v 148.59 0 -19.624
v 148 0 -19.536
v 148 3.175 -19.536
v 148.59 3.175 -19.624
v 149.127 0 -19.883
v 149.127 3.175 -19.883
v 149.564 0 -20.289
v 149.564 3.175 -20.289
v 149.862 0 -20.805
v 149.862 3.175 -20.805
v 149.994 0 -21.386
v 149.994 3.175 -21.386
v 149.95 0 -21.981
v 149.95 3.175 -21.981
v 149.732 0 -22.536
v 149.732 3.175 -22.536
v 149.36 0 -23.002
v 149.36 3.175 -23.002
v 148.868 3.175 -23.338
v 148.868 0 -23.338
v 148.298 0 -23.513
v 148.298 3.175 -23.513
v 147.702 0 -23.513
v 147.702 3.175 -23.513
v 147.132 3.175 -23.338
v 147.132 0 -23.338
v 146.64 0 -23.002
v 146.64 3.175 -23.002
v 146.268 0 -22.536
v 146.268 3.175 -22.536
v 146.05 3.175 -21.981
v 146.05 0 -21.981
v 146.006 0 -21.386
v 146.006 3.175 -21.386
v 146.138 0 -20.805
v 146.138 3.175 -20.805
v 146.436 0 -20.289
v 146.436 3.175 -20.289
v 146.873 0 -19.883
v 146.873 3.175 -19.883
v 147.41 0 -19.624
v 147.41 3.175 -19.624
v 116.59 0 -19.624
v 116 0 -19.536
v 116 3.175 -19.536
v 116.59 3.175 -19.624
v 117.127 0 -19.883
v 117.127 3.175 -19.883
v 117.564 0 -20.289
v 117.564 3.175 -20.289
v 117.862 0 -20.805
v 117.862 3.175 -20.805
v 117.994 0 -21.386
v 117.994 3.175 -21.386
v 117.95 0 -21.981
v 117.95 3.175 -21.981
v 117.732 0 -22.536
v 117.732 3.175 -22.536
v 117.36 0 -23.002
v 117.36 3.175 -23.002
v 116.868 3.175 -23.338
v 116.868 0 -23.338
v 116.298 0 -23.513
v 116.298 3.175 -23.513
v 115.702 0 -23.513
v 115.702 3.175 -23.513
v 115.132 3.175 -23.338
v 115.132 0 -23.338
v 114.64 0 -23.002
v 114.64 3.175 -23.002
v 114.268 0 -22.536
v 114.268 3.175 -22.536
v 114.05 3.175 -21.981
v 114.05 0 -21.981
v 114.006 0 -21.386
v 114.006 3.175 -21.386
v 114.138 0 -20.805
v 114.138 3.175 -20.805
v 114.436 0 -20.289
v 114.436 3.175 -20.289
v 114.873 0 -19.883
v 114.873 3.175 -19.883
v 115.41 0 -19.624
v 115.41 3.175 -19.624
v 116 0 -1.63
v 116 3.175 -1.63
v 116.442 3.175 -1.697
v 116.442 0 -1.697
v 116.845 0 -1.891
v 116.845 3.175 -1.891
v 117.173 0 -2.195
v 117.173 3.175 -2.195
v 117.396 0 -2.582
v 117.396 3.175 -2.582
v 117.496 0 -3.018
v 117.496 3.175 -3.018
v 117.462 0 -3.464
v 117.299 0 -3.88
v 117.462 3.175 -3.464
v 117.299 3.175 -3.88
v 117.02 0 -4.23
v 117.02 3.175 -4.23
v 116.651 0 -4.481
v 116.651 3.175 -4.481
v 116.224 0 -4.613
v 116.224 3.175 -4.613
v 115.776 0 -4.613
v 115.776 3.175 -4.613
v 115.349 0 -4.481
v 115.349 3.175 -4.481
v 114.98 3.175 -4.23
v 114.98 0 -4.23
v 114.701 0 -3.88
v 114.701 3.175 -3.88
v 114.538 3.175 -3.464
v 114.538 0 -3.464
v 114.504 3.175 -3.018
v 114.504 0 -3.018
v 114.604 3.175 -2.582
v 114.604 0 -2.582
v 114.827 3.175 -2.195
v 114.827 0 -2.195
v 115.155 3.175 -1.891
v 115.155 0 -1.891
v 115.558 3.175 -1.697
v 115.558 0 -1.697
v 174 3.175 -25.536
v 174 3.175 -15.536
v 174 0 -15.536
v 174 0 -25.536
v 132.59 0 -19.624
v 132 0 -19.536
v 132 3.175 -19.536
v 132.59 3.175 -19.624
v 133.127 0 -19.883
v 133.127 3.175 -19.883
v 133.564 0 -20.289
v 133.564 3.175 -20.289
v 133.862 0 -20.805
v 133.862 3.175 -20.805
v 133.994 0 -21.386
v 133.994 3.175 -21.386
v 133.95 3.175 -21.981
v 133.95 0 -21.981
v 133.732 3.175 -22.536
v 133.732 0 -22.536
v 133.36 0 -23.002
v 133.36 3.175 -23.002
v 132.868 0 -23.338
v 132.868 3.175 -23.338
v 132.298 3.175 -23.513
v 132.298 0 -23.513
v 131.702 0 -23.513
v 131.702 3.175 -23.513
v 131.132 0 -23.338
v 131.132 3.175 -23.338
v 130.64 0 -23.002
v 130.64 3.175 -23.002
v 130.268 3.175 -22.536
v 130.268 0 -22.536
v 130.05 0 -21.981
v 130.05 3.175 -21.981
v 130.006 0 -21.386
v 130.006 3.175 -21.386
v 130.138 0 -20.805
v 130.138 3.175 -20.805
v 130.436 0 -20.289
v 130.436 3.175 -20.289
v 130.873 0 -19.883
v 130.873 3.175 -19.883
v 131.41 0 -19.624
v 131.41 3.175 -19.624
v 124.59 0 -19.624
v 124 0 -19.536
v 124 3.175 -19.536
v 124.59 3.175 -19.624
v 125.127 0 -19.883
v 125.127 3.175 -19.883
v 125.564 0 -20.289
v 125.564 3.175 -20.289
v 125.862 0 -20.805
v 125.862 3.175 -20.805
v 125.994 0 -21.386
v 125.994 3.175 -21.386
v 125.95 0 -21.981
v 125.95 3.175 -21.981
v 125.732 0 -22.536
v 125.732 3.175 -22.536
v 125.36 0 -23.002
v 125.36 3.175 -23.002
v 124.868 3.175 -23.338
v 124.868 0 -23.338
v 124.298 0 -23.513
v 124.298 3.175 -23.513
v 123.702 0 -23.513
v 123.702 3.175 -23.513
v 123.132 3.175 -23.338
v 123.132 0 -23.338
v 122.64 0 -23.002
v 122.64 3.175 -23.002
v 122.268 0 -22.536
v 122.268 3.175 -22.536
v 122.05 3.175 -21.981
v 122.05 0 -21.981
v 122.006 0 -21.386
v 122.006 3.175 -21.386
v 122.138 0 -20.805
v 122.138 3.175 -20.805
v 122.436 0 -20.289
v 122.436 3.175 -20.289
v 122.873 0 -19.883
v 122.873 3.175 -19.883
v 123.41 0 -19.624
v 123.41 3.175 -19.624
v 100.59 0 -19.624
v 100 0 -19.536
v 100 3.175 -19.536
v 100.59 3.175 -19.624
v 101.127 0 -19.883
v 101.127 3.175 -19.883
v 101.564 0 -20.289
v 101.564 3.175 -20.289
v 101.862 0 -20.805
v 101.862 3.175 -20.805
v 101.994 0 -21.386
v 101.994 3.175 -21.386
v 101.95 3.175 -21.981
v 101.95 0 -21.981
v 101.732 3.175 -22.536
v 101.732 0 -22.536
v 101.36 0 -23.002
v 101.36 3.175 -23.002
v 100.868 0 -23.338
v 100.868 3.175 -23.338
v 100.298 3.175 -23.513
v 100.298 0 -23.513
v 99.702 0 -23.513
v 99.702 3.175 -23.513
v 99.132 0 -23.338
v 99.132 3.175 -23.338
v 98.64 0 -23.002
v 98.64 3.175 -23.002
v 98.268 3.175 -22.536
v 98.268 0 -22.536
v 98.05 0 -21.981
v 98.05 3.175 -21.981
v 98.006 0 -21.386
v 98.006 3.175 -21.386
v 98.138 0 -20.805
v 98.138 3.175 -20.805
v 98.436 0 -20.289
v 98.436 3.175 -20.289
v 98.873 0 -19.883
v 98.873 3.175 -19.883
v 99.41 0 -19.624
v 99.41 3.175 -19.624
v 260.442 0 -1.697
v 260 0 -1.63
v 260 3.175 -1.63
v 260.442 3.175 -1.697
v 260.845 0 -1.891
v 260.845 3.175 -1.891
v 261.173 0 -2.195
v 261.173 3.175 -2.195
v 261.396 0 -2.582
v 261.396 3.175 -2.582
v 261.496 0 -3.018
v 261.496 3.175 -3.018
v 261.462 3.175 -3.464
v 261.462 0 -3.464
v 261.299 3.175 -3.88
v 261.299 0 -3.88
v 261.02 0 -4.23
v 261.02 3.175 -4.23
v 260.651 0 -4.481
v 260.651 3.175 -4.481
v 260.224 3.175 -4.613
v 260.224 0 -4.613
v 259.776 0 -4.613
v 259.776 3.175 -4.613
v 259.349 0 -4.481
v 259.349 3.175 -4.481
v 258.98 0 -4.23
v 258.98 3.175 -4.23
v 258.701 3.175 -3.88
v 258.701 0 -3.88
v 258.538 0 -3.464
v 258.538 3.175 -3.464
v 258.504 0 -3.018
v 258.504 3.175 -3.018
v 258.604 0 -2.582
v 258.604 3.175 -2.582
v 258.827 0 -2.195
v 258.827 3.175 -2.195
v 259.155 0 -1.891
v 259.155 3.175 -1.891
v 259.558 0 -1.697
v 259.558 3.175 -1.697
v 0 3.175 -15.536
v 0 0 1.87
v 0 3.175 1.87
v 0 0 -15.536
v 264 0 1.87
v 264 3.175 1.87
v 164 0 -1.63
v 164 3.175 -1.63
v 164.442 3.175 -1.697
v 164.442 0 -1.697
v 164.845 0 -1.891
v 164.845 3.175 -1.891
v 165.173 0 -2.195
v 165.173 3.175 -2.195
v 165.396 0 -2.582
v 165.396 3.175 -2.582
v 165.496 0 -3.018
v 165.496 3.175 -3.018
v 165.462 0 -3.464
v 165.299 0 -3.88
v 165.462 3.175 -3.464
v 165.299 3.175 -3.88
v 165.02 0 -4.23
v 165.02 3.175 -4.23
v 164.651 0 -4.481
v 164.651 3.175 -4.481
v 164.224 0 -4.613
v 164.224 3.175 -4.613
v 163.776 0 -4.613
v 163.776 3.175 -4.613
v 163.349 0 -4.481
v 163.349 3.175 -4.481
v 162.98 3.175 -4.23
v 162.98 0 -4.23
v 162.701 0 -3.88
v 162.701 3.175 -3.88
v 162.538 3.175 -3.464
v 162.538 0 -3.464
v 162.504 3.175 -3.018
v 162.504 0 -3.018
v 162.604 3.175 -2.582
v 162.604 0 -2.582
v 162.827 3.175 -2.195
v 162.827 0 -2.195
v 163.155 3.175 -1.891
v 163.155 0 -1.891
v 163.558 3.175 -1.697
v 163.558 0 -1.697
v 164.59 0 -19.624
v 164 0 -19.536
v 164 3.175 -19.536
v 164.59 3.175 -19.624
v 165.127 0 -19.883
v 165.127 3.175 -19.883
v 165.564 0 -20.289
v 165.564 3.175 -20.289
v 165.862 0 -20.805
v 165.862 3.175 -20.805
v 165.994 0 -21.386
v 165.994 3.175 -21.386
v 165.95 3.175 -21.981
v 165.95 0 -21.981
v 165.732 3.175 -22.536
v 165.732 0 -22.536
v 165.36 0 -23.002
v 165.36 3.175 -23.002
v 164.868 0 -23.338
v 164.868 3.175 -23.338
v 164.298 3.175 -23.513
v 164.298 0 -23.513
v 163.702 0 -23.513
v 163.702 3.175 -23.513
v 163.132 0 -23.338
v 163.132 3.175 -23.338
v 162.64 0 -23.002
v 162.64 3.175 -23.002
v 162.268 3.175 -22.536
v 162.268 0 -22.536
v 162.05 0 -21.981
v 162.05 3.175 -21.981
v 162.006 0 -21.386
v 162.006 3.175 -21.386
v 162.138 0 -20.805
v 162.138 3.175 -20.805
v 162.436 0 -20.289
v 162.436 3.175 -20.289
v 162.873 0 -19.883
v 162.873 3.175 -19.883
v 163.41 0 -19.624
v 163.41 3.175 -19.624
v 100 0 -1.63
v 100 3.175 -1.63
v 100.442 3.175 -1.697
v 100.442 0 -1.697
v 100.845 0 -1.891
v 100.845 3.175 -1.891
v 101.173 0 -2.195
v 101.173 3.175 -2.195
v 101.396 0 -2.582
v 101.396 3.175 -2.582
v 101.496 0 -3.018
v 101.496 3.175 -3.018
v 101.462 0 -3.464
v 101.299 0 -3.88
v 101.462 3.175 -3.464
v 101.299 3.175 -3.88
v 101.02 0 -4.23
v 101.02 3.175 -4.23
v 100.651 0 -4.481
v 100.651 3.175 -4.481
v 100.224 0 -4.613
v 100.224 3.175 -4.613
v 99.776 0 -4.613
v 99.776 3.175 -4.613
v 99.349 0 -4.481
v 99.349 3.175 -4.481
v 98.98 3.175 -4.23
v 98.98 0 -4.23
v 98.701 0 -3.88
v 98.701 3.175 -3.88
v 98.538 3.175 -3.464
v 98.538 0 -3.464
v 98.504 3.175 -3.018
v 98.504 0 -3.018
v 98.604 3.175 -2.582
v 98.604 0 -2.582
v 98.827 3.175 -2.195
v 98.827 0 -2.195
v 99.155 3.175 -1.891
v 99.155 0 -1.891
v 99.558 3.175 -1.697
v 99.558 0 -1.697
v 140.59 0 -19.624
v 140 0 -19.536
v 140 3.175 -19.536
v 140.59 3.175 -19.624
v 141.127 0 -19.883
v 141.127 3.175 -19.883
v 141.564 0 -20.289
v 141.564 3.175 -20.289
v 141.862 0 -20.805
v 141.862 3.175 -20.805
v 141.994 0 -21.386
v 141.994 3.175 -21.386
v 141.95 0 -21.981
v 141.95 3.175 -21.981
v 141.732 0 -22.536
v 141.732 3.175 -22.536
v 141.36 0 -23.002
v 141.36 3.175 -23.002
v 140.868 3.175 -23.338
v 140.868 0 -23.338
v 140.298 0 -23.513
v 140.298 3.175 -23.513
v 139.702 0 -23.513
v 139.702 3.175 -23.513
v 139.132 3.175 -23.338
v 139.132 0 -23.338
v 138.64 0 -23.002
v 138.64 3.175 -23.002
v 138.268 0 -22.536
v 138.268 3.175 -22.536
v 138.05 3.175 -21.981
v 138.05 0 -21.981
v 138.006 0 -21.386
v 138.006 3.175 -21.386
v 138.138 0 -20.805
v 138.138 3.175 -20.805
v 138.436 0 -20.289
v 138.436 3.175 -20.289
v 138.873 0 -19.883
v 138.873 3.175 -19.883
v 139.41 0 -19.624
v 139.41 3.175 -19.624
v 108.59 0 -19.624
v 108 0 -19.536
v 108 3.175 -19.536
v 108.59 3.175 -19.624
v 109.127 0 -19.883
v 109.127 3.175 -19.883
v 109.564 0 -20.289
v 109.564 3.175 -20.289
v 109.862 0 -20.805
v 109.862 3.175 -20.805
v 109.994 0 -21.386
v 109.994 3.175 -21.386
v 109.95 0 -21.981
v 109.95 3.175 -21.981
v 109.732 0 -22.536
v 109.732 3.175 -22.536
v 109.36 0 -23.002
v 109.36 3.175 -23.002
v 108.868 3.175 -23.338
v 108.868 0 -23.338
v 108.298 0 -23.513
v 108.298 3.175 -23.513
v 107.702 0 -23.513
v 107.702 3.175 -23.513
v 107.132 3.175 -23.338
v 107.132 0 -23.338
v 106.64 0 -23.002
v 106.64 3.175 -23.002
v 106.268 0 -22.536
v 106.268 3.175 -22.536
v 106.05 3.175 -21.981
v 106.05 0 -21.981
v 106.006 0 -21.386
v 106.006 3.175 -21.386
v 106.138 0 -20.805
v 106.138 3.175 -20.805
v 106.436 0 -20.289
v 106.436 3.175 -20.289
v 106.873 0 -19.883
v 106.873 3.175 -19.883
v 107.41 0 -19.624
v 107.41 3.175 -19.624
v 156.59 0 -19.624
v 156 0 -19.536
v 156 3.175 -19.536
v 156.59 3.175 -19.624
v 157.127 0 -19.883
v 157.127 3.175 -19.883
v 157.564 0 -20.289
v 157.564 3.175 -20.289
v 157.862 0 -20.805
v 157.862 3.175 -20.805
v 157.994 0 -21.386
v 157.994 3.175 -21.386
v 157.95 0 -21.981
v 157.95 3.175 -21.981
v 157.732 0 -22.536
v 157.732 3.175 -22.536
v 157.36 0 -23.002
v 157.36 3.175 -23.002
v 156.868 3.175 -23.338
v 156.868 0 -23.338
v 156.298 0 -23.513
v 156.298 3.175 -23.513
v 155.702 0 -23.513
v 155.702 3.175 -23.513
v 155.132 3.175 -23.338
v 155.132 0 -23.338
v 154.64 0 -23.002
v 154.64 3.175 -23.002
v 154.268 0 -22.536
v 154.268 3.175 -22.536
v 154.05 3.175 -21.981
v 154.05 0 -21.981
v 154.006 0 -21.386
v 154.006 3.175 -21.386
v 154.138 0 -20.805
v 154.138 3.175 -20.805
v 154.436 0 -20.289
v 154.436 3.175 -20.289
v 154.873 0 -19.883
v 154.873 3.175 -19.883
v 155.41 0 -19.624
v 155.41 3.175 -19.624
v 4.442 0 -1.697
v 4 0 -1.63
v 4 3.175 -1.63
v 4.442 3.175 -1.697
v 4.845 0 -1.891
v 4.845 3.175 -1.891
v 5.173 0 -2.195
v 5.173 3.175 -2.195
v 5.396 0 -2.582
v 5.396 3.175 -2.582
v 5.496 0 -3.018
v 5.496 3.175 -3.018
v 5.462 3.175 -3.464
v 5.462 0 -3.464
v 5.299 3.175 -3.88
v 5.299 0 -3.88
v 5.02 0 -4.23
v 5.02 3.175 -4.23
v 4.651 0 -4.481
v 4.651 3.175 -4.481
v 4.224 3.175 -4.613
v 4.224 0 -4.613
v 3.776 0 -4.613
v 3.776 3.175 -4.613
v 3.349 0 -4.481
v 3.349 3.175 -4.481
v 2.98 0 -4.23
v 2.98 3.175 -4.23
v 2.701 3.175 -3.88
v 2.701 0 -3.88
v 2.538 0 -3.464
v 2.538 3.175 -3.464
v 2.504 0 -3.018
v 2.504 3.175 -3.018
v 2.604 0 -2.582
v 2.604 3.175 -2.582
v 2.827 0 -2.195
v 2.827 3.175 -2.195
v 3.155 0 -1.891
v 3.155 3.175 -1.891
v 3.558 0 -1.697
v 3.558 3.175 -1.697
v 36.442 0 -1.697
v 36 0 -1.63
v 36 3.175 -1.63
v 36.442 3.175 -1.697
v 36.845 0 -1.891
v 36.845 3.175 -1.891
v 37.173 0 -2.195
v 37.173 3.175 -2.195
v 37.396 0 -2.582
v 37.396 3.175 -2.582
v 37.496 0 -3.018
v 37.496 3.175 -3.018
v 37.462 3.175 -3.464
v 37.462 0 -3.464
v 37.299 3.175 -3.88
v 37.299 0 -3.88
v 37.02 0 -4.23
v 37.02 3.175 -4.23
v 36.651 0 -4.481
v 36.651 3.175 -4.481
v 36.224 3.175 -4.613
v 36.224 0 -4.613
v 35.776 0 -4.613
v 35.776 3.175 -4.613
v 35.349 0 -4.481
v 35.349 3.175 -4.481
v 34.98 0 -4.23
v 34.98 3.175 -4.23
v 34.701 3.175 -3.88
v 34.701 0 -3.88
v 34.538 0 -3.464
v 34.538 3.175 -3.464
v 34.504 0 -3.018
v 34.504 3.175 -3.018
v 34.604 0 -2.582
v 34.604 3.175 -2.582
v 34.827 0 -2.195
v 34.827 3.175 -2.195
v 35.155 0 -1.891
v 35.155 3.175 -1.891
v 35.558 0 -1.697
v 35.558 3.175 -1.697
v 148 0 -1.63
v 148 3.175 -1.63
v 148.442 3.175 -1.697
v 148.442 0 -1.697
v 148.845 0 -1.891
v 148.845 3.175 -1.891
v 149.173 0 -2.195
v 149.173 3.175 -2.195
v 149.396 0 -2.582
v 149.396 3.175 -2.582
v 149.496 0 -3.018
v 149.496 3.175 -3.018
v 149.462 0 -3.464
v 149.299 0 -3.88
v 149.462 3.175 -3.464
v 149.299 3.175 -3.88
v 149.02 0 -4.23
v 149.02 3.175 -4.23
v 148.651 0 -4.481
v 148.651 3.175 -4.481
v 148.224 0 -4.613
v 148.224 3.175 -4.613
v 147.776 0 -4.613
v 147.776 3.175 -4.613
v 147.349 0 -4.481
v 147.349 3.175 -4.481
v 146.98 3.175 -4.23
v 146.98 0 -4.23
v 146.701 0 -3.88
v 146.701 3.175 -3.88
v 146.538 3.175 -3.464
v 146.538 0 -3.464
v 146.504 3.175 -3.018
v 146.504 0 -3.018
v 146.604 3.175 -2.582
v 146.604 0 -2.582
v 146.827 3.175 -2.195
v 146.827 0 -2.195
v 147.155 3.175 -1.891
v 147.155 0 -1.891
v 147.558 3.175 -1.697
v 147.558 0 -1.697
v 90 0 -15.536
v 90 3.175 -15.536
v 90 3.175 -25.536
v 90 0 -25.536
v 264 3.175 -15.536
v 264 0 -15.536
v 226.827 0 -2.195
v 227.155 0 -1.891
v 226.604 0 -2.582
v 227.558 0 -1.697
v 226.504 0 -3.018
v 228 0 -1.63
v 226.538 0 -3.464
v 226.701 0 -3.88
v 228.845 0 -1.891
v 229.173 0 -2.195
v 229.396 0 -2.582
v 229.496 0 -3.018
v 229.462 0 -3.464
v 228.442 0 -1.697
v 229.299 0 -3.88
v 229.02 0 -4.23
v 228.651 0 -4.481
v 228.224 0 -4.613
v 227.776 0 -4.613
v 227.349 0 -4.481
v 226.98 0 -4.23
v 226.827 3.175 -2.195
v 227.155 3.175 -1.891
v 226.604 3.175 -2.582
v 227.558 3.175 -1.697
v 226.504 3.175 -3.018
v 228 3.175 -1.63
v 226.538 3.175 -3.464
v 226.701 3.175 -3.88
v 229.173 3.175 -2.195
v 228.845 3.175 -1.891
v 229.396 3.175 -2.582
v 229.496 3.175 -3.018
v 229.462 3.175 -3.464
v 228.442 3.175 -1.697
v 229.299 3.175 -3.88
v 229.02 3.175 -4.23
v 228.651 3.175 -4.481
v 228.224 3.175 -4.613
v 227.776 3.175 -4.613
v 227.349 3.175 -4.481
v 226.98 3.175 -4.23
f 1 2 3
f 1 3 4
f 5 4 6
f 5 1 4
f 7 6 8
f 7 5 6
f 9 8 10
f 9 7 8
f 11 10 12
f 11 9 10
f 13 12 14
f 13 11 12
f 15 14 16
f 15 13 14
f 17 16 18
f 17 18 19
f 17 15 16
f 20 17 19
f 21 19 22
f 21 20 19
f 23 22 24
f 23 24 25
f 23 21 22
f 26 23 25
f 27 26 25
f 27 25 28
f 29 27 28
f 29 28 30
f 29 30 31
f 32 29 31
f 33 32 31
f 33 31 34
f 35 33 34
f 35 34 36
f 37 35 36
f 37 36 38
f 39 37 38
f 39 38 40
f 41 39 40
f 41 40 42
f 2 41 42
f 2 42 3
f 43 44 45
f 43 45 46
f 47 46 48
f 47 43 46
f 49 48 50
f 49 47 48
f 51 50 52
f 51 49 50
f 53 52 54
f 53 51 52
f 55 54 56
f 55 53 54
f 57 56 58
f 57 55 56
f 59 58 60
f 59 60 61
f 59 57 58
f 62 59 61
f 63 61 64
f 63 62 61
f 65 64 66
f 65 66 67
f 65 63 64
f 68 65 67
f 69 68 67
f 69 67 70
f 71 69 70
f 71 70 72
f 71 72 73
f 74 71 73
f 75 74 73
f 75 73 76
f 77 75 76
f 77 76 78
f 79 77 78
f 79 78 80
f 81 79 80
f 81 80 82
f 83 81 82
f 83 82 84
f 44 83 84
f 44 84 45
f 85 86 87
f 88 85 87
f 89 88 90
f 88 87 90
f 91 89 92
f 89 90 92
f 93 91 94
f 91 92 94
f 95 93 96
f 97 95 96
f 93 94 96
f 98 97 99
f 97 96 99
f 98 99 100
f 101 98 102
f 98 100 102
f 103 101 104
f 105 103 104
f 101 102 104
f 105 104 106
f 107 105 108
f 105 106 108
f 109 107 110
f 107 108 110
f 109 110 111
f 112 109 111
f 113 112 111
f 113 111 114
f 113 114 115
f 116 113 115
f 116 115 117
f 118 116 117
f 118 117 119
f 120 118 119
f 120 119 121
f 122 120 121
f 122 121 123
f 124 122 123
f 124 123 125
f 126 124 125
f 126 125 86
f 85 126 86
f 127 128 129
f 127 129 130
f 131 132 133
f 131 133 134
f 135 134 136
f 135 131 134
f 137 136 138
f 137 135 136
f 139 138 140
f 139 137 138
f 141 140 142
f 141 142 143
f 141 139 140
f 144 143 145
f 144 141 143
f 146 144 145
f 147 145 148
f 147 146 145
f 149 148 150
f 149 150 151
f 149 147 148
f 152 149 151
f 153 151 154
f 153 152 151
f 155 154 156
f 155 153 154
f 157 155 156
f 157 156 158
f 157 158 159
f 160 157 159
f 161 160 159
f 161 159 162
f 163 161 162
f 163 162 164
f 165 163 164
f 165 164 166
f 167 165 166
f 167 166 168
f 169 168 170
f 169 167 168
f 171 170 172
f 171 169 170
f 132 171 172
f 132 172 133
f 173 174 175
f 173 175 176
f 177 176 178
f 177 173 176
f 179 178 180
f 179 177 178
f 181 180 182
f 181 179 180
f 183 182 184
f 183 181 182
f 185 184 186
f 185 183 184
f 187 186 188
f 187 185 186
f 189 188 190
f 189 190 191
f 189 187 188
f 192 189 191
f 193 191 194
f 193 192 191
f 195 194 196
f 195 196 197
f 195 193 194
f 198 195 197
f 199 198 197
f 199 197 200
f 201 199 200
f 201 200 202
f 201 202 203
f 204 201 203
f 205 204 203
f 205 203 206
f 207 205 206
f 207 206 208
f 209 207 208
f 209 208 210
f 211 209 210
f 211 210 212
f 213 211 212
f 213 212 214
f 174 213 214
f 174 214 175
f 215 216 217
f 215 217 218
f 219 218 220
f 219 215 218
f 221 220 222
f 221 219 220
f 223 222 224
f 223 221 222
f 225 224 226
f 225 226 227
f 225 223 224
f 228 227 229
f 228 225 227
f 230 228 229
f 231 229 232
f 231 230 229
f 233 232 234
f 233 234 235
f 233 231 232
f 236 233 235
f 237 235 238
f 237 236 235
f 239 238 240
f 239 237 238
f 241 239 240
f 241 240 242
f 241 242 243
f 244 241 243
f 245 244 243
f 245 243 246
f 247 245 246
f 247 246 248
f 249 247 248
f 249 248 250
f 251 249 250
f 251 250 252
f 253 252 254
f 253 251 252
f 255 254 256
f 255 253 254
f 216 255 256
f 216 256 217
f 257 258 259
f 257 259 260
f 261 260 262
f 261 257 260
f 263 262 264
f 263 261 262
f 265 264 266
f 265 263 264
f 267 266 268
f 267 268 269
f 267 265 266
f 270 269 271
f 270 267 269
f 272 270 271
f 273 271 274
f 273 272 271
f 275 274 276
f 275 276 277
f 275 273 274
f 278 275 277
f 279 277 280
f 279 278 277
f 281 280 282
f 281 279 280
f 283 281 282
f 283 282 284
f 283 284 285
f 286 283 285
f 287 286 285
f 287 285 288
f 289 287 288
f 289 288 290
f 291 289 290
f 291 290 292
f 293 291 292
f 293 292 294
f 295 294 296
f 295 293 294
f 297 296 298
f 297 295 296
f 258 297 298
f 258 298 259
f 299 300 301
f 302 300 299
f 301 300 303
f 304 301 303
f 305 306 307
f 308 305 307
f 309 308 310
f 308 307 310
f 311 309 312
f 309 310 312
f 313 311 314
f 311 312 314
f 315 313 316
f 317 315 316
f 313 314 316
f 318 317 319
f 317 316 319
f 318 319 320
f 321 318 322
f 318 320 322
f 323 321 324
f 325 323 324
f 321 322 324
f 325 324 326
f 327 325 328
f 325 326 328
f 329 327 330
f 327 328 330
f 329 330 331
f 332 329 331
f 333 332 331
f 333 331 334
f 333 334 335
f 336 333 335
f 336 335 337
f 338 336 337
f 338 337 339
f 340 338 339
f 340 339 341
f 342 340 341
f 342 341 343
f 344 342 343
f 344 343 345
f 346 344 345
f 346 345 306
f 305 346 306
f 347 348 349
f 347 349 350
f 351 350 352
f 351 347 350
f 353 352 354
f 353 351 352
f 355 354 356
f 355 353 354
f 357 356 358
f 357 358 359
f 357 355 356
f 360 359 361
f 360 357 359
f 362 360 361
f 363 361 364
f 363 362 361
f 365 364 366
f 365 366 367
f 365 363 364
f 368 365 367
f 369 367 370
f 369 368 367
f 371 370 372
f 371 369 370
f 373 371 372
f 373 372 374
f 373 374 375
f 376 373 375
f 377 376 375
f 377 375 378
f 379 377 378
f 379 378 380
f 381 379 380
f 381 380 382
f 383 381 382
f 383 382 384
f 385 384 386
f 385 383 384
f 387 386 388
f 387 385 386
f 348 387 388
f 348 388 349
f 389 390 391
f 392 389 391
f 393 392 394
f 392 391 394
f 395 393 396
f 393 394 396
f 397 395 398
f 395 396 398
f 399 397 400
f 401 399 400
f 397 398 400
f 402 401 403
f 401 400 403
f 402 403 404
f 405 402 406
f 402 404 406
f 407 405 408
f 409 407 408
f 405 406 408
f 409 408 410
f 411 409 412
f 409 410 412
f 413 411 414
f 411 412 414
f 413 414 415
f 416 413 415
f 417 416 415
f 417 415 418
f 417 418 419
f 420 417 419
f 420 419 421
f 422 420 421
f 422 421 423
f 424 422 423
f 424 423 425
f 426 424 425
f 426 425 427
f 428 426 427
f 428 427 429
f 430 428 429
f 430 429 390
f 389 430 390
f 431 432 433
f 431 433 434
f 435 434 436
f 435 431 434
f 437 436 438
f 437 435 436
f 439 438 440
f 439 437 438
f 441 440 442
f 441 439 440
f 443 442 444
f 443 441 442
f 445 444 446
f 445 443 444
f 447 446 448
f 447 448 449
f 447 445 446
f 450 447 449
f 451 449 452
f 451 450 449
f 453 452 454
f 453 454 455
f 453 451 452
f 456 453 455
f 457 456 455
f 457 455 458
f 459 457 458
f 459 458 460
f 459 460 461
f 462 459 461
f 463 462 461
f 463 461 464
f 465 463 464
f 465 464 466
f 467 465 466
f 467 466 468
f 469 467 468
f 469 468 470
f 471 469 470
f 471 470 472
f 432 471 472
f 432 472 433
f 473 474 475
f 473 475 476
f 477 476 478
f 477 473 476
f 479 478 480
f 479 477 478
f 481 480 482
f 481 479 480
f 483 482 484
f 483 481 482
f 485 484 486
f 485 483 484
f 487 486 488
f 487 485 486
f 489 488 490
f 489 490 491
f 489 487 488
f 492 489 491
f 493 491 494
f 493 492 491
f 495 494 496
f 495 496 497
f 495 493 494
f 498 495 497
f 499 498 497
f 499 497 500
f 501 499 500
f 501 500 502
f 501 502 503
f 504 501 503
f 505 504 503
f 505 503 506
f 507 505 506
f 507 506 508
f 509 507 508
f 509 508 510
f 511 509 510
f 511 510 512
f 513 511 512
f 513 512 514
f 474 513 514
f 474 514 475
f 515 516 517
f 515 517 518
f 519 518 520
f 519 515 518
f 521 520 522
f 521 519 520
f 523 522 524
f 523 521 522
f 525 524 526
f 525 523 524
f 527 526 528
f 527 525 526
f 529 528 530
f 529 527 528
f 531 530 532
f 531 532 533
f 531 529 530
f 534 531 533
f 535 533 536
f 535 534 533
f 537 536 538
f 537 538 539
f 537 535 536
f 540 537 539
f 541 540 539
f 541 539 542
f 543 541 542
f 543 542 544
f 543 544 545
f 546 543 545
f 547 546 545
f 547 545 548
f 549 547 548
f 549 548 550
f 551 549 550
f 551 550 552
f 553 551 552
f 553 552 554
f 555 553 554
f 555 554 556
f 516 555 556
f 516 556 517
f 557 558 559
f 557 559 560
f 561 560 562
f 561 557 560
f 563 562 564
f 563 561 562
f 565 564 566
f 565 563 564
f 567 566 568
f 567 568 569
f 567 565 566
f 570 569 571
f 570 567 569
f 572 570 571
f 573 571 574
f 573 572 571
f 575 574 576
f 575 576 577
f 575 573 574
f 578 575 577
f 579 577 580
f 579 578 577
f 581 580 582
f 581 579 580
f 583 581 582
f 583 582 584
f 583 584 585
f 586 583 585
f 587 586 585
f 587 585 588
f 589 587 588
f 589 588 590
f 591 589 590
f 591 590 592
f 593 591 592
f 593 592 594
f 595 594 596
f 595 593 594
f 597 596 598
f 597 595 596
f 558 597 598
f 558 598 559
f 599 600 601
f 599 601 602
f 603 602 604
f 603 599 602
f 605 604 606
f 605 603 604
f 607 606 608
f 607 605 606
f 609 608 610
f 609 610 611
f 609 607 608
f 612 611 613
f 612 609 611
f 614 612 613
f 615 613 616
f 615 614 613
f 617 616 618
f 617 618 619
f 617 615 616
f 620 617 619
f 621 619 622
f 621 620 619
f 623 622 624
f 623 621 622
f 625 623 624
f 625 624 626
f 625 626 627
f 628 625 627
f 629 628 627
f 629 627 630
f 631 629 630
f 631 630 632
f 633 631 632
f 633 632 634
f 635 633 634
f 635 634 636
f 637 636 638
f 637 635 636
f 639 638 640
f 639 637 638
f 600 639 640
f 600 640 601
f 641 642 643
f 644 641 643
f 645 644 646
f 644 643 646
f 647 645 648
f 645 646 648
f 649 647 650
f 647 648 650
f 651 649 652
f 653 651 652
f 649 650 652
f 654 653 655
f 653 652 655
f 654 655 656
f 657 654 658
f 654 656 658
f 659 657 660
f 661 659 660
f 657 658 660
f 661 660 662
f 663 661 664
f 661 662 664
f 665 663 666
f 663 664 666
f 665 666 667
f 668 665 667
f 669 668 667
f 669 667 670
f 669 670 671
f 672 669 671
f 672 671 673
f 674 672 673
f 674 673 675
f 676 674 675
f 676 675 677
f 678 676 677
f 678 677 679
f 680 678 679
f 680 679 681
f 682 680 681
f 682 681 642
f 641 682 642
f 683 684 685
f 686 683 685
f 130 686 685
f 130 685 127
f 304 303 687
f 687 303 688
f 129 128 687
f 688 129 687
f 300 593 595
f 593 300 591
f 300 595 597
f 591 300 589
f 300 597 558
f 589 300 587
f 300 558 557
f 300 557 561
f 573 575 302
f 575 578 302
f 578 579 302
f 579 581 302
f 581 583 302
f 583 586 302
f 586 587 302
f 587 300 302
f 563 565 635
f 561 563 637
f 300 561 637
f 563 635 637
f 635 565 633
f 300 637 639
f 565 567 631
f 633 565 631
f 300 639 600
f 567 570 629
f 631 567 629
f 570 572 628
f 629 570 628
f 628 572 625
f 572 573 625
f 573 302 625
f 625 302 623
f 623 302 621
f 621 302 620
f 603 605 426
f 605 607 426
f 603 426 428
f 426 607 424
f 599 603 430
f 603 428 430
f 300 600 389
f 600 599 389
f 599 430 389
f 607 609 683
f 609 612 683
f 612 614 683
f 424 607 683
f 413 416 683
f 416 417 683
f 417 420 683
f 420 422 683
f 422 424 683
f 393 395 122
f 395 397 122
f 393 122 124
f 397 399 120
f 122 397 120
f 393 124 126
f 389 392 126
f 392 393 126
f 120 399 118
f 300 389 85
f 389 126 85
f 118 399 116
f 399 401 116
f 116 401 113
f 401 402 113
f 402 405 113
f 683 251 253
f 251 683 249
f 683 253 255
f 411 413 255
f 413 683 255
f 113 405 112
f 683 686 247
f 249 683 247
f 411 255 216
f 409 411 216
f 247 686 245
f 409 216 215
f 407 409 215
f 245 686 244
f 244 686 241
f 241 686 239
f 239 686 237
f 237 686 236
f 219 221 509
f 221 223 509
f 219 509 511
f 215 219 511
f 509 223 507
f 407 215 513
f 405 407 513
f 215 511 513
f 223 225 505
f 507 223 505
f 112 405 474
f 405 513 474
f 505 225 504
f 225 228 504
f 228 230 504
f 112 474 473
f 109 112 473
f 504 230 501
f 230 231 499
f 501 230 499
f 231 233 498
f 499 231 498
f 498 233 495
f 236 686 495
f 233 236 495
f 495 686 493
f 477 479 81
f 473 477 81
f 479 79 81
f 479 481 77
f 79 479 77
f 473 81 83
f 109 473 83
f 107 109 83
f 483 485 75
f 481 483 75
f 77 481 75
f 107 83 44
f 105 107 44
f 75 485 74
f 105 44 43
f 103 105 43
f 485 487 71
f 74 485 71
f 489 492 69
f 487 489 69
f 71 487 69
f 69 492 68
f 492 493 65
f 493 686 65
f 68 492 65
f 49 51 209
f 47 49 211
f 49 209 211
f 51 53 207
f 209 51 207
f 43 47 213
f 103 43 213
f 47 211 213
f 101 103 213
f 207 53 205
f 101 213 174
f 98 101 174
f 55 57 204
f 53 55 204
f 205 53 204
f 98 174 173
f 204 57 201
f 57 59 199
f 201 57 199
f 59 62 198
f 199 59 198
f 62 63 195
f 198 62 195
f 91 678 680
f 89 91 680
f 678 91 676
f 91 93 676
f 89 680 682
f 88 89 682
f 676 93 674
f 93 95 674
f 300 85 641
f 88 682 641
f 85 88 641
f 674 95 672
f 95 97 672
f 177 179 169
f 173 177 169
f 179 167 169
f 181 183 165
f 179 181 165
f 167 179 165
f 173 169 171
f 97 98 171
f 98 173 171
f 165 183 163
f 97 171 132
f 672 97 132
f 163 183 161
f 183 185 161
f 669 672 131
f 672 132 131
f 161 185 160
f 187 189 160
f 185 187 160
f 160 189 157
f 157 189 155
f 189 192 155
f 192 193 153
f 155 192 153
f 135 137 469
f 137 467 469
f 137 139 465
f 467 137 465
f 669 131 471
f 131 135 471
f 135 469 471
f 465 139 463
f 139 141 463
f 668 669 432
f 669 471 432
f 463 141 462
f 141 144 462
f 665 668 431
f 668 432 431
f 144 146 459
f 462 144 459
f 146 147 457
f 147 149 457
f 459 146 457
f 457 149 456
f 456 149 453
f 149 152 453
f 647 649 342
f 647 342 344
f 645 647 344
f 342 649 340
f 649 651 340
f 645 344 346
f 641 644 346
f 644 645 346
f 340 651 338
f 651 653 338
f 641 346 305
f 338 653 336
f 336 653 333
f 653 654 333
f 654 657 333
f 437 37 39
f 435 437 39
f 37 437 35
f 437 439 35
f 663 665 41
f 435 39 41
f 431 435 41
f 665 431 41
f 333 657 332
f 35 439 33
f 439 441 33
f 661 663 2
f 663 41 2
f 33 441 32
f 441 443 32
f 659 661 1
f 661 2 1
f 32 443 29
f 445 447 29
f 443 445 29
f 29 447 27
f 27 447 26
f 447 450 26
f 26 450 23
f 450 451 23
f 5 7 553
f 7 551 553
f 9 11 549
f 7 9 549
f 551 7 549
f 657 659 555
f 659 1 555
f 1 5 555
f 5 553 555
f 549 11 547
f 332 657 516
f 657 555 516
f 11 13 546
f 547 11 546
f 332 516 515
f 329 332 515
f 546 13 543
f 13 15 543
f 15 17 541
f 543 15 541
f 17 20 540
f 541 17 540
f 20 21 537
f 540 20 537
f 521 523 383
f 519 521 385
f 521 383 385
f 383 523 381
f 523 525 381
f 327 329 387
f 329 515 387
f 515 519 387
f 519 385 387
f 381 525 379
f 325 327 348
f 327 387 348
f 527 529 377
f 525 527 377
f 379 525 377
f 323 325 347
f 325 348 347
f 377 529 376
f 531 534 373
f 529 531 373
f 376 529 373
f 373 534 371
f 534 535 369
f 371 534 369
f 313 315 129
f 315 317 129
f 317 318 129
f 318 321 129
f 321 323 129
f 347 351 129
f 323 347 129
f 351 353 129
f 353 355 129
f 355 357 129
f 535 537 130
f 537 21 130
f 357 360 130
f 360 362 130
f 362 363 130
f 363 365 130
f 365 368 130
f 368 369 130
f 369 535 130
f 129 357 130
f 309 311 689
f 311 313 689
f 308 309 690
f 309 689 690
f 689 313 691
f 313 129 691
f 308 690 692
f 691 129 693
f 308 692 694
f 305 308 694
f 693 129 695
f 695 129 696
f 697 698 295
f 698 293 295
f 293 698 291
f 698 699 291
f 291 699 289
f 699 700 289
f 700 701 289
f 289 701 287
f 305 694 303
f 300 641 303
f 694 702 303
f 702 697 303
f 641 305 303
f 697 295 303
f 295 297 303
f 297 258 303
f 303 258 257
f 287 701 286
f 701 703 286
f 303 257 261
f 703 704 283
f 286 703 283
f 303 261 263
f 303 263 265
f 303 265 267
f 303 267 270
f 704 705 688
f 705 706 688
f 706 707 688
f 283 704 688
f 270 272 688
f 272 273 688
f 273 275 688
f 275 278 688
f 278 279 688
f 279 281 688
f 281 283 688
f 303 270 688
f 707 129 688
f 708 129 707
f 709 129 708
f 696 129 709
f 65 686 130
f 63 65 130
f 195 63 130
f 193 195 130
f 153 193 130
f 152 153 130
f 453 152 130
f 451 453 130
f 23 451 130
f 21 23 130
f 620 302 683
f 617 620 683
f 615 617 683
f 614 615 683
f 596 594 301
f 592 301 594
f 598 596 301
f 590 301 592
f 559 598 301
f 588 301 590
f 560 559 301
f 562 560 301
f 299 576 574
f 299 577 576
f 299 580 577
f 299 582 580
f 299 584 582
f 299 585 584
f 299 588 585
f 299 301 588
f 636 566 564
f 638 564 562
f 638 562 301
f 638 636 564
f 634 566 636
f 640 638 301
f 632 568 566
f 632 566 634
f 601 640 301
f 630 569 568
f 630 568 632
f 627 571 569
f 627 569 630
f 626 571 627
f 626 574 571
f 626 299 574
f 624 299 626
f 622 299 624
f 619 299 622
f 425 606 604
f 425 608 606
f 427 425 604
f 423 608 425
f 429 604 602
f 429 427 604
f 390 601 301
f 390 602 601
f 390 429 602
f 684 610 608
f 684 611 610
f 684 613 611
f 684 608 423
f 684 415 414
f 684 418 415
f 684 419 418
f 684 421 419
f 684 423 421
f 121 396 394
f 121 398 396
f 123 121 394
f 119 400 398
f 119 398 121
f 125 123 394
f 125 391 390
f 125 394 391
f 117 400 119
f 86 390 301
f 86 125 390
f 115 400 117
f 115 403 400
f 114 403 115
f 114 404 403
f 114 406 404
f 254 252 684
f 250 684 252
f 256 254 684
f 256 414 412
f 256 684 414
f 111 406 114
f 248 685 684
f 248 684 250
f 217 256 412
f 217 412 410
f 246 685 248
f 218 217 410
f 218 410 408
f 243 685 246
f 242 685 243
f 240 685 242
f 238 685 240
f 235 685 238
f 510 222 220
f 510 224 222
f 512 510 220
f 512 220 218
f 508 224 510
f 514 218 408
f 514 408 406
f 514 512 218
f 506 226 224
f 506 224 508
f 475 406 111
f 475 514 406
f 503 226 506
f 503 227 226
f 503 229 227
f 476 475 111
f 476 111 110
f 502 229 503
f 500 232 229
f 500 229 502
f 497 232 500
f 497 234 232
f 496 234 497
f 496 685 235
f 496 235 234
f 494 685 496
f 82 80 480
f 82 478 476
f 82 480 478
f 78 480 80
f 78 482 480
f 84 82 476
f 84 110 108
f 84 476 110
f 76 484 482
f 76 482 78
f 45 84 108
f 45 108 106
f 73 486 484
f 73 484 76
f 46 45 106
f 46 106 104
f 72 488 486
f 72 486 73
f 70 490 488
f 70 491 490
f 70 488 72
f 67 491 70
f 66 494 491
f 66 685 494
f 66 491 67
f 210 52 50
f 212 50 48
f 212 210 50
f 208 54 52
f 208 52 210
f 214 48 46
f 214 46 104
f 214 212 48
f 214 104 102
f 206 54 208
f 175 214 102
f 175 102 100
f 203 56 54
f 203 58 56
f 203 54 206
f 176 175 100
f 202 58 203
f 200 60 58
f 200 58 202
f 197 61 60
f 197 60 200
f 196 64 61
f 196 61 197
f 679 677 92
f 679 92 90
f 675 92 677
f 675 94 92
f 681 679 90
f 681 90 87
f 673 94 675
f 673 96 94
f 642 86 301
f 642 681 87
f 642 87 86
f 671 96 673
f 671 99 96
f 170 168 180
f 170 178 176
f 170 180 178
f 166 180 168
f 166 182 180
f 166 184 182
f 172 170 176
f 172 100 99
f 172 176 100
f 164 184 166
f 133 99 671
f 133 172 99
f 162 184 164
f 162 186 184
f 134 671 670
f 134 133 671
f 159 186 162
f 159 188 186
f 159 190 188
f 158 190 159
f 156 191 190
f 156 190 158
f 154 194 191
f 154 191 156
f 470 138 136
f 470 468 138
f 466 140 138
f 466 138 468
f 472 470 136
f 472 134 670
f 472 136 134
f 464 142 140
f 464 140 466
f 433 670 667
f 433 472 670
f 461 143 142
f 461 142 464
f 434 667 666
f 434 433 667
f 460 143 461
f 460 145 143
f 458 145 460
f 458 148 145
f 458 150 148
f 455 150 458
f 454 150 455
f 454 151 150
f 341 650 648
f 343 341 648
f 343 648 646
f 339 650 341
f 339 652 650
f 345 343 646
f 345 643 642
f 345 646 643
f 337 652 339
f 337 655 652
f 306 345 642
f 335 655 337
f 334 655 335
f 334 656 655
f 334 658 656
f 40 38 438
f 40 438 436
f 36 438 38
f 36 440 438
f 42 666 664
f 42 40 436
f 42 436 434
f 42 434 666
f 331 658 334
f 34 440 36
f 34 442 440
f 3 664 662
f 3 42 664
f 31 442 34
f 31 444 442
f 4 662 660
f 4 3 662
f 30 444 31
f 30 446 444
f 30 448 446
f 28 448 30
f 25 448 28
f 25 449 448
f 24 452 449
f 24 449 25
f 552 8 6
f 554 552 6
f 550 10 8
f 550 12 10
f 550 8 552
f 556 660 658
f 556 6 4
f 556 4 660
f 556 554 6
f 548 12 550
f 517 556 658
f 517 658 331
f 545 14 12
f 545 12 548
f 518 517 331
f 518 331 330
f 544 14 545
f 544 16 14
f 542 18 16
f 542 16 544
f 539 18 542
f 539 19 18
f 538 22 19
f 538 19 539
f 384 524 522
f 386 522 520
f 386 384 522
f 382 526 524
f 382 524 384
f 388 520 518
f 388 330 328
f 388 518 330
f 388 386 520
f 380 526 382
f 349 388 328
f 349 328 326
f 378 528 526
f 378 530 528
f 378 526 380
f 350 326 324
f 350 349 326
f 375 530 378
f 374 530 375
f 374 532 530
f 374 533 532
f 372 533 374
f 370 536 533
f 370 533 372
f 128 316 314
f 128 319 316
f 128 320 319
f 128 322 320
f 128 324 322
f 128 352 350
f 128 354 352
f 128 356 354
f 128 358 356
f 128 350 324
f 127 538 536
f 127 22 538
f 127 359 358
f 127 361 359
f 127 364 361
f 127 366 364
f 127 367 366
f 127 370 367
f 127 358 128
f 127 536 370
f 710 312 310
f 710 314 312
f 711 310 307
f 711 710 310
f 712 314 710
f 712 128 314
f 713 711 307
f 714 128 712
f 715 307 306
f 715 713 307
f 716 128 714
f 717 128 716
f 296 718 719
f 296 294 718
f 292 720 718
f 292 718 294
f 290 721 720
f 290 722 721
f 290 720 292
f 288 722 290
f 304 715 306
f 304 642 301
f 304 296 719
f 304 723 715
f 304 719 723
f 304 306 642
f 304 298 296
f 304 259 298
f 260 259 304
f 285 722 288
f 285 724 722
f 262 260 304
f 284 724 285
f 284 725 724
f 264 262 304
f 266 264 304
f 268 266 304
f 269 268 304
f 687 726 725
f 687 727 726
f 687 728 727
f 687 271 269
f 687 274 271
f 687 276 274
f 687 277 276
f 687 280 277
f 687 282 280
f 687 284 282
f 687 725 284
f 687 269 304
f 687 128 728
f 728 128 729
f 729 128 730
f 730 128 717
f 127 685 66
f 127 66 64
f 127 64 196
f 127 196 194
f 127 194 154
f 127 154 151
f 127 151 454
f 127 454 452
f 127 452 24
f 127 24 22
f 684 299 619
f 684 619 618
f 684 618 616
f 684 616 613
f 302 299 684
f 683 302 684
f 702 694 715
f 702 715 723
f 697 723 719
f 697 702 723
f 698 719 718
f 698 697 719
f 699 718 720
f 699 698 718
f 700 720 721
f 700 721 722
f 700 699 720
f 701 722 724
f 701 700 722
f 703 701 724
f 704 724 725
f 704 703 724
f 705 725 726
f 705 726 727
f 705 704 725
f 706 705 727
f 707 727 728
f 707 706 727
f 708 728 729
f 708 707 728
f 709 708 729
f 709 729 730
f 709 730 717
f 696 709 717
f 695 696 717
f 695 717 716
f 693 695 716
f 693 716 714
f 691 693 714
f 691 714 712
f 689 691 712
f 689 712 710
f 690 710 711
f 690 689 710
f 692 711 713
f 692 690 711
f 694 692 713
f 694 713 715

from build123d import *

# Parameters (mm, degrees)
SKETCH1_R           = 2
SKETCH1_R_2         = 1.5
BOSS_EXTRUDE1_DEPTH = 3.175
SKETCH2_R           = 1.5
CUT_EXTRUDE1_DEPTH  = 10
SKETCH3_W           = 90
SKETCH3_H           = 10
CUT_EXTRUDE2_DEPTH  = 10
CUT_EXTRUDE3_START  = -10
SKETCH4_R           = 2
CUT_EXTRUDE3_DEPTH  = 10


with BuildPart() as part:
    # Sketch1 → Boss-Extrude1 (new body)
    with BuildSketch(Plane(origin=(0, 0, 0), x_dir=(1, 0, 0), z_dir=(0, 1, 0))):
        Polygon((0, 25.535634143), (0, -1.869964777), (264, -1.869964777), (264, 3.130035223), (264, 25.535634143), align=None)
        with Locations((132, 21.535634143)):
            Circle(SKETCH1_R, mode=Mode.SUBTRACT)
        with Locations((100, 21.535634143)):
            Circle(SKETCH1_R, mode=Mode.SUBTRACT)
        with Locations((68, 21.535634143)):
            Circle(SKETCH1_R, mode=Mode.SUBTRACT)
        with Locations((196, 21.535634143)):
            Circle(SKETCH1_R, mode=Mode.SUBTRACT)
        with Locations((164, 21.535634143)):
            Circle(SKETCH1_R, mode=Mode.SUBTRACT)
        with Locations((260, 3.130035223)):
            Circle(SKETCH1_R_2, mode=Mode.SUBTRACT)
        with Locations((36, 3.130035223)):
            Circle(SKETCH1_R_2, mode=Mode.SUBTRACT)
        with Locations((228, 3.130035223)):
            Circle(SKETCH1_R_2, mode=Mode.SUBTRACT)
        with Locations((4, 3.130035223)):
            Circle(SKETCH1_R_2, mode=Mode.SUBTRACT)
    extrude(amount=BOSS_EXTRUDE1_DEPTH)

    # Sketch2 → Cut-Extrude1 (cut)
    with BuildSketch(Plane(origin=(0, 3.175, 0), x_dir=(1, 0, 0), z_dir=(0, 1, 0))):
        with Locations((116, 3.130035223)):
            Circle(SKETCH2_R)
        with Locations((148, 3.130035223)):
            Circle(SKETCH2_R)
        with Locations((100, 3.130035223)):
            Circle(SKETCH2_R)
        with Locations((164, 3.130035223)):
            Circle(SKETCH2_R)
    extrude(amount=-CUT_EXTRUDE1_DEPTH, mode=Mode.SUBTRACT)

    # Sketch3 → Cut-Extrude2 (cut)
    with BuildSketch(Plane(origin=(0, 3.175, 0), x_dir=(1, 0, 0), z_dir=(0, 1, 0))):
        with Locations((45, 20.535634143)):
            Rectangle(SKETCH3_W, SKETCH3_H)
        with Locations((219, 20.535634143)):
            Rectangle(SKETCH3_W, SKETCH3_H)
    extrude(amount=-CUT_EXTRUDE2_DEPTH, mode=Mode.SUBTRACT)

    # Sketch4 → Cut-Extrude3 (cut)
    with BuildSketch(Plane(origin=(0, 3.175, 0), x_dir=(1, 0, 0), z_dir=(0, 1, 0)).offset(CUT_EXTRUDE3_START)):
        with Locations((100, 21.535634143)):
            Circle(SKETCH4_R)
        with Locations((108, 21.535634143)):
            Circle(SKETCH4_R)
        with Locations((116, 21.535634143)):
            Circle(SKETCH4_R)
        with Locations((124, 21.535634143)):
            Circle(SKETCH4_R)
        with Locations((132, 21.535634143)):
            Circle(SKETCH4_R)
        with Locations((140, 21.535634143)):
            Circle(SKETCH4_R)
        with Locations((148, 21.535634143)):
            Circle(SKETCH4_R)
        with Locations((156, 21.535634143)):
            Circle(SKETCH4_R)
        with Locations((164, 21.535634143)):
            Circle(SKETCH4_R)
    extrude(amount=CUT_EXTRUDE3_DEPTH, mode=Mode.SUBTRACT)


solid = part.part
